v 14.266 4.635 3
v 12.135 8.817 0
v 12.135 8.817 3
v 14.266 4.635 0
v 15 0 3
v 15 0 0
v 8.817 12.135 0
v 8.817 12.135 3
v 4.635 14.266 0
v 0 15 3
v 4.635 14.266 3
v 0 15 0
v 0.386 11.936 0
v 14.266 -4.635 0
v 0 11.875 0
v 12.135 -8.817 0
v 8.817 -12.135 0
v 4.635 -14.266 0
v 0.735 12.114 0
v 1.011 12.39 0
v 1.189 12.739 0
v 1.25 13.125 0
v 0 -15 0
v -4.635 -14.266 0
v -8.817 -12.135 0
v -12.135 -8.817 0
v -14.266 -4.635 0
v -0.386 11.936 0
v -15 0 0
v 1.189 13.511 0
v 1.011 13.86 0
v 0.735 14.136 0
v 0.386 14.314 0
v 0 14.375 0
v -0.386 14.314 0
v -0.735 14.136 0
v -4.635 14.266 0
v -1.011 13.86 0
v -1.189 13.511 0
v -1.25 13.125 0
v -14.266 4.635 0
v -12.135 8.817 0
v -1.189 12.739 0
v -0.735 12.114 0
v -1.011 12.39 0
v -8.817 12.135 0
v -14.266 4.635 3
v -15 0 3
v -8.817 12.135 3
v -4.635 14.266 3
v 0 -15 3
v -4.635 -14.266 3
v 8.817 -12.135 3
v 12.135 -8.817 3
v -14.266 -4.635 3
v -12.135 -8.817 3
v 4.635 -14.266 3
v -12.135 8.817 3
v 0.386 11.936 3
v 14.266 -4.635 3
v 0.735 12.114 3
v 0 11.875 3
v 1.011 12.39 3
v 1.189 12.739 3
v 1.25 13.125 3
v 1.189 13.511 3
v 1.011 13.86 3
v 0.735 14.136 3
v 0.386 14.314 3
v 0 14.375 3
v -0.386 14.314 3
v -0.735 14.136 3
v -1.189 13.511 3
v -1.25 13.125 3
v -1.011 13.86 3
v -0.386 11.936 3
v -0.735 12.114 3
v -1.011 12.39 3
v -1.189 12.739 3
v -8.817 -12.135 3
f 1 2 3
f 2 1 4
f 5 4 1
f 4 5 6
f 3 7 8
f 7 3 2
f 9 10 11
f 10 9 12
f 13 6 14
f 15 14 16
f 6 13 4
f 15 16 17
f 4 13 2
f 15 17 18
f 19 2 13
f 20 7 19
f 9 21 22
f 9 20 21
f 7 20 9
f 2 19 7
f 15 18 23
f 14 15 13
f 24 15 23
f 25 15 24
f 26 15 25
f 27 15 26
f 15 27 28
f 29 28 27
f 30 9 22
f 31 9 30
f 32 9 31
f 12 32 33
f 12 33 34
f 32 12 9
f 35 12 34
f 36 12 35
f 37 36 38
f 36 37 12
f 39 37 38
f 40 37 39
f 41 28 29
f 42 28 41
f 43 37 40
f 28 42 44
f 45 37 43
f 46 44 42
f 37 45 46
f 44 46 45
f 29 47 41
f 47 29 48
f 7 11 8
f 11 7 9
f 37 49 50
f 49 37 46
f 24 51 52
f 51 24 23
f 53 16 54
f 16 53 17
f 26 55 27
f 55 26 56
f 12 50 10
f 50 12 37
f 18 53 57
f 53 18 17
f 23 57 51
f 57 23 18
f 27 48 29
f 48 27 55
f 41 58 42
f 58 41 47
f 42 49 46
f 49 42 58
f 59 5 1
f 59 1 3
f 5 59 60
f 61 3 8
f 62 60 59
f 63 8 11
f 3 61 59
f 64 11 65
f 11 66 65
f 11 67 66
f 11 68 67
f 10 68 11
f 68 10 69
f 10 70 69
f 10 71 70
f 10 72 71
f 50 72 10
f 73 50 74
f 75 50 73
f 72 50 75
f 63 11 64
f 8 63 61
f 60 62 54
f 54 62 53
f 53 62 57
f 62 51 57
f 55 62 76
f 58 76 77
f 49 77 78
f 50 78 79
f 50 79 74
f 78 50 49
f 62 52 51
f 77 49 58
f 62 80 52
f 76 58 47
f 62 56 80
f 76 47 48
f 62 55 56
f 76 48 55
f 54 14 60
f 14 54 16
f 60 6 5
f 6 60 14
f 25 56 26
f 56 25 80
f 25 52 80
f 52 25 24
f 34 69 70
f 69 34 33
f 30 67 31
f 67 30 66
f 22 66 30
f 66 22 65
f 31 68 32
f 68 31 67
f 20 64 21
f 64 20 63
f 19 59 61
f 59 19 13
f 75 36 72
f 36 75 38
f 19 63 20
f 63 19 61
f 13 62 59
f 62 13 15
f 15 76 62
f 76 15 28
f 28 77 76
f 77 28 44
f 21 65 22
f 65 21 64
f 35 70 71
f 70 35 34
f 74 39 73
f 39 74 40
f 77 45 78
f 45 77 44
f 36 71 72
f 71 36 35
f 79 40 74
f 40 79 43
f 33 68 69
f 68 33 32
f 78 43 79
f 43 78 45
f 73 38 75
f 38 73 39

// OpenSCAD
// coin dimensions
roundness=20;
coinHeight=3;
coinRadius=15;

// coin image
coinImage="Safenetwork.png";
imageSize=coinRadius*1.5;
imageHeight=coinHeight*1.5;

// pendant option
isPendant=true;

difference(){
    difference(){
        cylinder(h=coinHeight, r=coinRadius, center=false, $fn=roundness);
        resize([imageSize,imageSize,imageHeight])
            surface(file=coinImage, center=true, invert=false);
    }
    if(isPendant){
        translate([0,coinRadius*.875,0])
            cylinder(h=coinHeight, r=1.25, center=false, $fn=20);
    }
}
